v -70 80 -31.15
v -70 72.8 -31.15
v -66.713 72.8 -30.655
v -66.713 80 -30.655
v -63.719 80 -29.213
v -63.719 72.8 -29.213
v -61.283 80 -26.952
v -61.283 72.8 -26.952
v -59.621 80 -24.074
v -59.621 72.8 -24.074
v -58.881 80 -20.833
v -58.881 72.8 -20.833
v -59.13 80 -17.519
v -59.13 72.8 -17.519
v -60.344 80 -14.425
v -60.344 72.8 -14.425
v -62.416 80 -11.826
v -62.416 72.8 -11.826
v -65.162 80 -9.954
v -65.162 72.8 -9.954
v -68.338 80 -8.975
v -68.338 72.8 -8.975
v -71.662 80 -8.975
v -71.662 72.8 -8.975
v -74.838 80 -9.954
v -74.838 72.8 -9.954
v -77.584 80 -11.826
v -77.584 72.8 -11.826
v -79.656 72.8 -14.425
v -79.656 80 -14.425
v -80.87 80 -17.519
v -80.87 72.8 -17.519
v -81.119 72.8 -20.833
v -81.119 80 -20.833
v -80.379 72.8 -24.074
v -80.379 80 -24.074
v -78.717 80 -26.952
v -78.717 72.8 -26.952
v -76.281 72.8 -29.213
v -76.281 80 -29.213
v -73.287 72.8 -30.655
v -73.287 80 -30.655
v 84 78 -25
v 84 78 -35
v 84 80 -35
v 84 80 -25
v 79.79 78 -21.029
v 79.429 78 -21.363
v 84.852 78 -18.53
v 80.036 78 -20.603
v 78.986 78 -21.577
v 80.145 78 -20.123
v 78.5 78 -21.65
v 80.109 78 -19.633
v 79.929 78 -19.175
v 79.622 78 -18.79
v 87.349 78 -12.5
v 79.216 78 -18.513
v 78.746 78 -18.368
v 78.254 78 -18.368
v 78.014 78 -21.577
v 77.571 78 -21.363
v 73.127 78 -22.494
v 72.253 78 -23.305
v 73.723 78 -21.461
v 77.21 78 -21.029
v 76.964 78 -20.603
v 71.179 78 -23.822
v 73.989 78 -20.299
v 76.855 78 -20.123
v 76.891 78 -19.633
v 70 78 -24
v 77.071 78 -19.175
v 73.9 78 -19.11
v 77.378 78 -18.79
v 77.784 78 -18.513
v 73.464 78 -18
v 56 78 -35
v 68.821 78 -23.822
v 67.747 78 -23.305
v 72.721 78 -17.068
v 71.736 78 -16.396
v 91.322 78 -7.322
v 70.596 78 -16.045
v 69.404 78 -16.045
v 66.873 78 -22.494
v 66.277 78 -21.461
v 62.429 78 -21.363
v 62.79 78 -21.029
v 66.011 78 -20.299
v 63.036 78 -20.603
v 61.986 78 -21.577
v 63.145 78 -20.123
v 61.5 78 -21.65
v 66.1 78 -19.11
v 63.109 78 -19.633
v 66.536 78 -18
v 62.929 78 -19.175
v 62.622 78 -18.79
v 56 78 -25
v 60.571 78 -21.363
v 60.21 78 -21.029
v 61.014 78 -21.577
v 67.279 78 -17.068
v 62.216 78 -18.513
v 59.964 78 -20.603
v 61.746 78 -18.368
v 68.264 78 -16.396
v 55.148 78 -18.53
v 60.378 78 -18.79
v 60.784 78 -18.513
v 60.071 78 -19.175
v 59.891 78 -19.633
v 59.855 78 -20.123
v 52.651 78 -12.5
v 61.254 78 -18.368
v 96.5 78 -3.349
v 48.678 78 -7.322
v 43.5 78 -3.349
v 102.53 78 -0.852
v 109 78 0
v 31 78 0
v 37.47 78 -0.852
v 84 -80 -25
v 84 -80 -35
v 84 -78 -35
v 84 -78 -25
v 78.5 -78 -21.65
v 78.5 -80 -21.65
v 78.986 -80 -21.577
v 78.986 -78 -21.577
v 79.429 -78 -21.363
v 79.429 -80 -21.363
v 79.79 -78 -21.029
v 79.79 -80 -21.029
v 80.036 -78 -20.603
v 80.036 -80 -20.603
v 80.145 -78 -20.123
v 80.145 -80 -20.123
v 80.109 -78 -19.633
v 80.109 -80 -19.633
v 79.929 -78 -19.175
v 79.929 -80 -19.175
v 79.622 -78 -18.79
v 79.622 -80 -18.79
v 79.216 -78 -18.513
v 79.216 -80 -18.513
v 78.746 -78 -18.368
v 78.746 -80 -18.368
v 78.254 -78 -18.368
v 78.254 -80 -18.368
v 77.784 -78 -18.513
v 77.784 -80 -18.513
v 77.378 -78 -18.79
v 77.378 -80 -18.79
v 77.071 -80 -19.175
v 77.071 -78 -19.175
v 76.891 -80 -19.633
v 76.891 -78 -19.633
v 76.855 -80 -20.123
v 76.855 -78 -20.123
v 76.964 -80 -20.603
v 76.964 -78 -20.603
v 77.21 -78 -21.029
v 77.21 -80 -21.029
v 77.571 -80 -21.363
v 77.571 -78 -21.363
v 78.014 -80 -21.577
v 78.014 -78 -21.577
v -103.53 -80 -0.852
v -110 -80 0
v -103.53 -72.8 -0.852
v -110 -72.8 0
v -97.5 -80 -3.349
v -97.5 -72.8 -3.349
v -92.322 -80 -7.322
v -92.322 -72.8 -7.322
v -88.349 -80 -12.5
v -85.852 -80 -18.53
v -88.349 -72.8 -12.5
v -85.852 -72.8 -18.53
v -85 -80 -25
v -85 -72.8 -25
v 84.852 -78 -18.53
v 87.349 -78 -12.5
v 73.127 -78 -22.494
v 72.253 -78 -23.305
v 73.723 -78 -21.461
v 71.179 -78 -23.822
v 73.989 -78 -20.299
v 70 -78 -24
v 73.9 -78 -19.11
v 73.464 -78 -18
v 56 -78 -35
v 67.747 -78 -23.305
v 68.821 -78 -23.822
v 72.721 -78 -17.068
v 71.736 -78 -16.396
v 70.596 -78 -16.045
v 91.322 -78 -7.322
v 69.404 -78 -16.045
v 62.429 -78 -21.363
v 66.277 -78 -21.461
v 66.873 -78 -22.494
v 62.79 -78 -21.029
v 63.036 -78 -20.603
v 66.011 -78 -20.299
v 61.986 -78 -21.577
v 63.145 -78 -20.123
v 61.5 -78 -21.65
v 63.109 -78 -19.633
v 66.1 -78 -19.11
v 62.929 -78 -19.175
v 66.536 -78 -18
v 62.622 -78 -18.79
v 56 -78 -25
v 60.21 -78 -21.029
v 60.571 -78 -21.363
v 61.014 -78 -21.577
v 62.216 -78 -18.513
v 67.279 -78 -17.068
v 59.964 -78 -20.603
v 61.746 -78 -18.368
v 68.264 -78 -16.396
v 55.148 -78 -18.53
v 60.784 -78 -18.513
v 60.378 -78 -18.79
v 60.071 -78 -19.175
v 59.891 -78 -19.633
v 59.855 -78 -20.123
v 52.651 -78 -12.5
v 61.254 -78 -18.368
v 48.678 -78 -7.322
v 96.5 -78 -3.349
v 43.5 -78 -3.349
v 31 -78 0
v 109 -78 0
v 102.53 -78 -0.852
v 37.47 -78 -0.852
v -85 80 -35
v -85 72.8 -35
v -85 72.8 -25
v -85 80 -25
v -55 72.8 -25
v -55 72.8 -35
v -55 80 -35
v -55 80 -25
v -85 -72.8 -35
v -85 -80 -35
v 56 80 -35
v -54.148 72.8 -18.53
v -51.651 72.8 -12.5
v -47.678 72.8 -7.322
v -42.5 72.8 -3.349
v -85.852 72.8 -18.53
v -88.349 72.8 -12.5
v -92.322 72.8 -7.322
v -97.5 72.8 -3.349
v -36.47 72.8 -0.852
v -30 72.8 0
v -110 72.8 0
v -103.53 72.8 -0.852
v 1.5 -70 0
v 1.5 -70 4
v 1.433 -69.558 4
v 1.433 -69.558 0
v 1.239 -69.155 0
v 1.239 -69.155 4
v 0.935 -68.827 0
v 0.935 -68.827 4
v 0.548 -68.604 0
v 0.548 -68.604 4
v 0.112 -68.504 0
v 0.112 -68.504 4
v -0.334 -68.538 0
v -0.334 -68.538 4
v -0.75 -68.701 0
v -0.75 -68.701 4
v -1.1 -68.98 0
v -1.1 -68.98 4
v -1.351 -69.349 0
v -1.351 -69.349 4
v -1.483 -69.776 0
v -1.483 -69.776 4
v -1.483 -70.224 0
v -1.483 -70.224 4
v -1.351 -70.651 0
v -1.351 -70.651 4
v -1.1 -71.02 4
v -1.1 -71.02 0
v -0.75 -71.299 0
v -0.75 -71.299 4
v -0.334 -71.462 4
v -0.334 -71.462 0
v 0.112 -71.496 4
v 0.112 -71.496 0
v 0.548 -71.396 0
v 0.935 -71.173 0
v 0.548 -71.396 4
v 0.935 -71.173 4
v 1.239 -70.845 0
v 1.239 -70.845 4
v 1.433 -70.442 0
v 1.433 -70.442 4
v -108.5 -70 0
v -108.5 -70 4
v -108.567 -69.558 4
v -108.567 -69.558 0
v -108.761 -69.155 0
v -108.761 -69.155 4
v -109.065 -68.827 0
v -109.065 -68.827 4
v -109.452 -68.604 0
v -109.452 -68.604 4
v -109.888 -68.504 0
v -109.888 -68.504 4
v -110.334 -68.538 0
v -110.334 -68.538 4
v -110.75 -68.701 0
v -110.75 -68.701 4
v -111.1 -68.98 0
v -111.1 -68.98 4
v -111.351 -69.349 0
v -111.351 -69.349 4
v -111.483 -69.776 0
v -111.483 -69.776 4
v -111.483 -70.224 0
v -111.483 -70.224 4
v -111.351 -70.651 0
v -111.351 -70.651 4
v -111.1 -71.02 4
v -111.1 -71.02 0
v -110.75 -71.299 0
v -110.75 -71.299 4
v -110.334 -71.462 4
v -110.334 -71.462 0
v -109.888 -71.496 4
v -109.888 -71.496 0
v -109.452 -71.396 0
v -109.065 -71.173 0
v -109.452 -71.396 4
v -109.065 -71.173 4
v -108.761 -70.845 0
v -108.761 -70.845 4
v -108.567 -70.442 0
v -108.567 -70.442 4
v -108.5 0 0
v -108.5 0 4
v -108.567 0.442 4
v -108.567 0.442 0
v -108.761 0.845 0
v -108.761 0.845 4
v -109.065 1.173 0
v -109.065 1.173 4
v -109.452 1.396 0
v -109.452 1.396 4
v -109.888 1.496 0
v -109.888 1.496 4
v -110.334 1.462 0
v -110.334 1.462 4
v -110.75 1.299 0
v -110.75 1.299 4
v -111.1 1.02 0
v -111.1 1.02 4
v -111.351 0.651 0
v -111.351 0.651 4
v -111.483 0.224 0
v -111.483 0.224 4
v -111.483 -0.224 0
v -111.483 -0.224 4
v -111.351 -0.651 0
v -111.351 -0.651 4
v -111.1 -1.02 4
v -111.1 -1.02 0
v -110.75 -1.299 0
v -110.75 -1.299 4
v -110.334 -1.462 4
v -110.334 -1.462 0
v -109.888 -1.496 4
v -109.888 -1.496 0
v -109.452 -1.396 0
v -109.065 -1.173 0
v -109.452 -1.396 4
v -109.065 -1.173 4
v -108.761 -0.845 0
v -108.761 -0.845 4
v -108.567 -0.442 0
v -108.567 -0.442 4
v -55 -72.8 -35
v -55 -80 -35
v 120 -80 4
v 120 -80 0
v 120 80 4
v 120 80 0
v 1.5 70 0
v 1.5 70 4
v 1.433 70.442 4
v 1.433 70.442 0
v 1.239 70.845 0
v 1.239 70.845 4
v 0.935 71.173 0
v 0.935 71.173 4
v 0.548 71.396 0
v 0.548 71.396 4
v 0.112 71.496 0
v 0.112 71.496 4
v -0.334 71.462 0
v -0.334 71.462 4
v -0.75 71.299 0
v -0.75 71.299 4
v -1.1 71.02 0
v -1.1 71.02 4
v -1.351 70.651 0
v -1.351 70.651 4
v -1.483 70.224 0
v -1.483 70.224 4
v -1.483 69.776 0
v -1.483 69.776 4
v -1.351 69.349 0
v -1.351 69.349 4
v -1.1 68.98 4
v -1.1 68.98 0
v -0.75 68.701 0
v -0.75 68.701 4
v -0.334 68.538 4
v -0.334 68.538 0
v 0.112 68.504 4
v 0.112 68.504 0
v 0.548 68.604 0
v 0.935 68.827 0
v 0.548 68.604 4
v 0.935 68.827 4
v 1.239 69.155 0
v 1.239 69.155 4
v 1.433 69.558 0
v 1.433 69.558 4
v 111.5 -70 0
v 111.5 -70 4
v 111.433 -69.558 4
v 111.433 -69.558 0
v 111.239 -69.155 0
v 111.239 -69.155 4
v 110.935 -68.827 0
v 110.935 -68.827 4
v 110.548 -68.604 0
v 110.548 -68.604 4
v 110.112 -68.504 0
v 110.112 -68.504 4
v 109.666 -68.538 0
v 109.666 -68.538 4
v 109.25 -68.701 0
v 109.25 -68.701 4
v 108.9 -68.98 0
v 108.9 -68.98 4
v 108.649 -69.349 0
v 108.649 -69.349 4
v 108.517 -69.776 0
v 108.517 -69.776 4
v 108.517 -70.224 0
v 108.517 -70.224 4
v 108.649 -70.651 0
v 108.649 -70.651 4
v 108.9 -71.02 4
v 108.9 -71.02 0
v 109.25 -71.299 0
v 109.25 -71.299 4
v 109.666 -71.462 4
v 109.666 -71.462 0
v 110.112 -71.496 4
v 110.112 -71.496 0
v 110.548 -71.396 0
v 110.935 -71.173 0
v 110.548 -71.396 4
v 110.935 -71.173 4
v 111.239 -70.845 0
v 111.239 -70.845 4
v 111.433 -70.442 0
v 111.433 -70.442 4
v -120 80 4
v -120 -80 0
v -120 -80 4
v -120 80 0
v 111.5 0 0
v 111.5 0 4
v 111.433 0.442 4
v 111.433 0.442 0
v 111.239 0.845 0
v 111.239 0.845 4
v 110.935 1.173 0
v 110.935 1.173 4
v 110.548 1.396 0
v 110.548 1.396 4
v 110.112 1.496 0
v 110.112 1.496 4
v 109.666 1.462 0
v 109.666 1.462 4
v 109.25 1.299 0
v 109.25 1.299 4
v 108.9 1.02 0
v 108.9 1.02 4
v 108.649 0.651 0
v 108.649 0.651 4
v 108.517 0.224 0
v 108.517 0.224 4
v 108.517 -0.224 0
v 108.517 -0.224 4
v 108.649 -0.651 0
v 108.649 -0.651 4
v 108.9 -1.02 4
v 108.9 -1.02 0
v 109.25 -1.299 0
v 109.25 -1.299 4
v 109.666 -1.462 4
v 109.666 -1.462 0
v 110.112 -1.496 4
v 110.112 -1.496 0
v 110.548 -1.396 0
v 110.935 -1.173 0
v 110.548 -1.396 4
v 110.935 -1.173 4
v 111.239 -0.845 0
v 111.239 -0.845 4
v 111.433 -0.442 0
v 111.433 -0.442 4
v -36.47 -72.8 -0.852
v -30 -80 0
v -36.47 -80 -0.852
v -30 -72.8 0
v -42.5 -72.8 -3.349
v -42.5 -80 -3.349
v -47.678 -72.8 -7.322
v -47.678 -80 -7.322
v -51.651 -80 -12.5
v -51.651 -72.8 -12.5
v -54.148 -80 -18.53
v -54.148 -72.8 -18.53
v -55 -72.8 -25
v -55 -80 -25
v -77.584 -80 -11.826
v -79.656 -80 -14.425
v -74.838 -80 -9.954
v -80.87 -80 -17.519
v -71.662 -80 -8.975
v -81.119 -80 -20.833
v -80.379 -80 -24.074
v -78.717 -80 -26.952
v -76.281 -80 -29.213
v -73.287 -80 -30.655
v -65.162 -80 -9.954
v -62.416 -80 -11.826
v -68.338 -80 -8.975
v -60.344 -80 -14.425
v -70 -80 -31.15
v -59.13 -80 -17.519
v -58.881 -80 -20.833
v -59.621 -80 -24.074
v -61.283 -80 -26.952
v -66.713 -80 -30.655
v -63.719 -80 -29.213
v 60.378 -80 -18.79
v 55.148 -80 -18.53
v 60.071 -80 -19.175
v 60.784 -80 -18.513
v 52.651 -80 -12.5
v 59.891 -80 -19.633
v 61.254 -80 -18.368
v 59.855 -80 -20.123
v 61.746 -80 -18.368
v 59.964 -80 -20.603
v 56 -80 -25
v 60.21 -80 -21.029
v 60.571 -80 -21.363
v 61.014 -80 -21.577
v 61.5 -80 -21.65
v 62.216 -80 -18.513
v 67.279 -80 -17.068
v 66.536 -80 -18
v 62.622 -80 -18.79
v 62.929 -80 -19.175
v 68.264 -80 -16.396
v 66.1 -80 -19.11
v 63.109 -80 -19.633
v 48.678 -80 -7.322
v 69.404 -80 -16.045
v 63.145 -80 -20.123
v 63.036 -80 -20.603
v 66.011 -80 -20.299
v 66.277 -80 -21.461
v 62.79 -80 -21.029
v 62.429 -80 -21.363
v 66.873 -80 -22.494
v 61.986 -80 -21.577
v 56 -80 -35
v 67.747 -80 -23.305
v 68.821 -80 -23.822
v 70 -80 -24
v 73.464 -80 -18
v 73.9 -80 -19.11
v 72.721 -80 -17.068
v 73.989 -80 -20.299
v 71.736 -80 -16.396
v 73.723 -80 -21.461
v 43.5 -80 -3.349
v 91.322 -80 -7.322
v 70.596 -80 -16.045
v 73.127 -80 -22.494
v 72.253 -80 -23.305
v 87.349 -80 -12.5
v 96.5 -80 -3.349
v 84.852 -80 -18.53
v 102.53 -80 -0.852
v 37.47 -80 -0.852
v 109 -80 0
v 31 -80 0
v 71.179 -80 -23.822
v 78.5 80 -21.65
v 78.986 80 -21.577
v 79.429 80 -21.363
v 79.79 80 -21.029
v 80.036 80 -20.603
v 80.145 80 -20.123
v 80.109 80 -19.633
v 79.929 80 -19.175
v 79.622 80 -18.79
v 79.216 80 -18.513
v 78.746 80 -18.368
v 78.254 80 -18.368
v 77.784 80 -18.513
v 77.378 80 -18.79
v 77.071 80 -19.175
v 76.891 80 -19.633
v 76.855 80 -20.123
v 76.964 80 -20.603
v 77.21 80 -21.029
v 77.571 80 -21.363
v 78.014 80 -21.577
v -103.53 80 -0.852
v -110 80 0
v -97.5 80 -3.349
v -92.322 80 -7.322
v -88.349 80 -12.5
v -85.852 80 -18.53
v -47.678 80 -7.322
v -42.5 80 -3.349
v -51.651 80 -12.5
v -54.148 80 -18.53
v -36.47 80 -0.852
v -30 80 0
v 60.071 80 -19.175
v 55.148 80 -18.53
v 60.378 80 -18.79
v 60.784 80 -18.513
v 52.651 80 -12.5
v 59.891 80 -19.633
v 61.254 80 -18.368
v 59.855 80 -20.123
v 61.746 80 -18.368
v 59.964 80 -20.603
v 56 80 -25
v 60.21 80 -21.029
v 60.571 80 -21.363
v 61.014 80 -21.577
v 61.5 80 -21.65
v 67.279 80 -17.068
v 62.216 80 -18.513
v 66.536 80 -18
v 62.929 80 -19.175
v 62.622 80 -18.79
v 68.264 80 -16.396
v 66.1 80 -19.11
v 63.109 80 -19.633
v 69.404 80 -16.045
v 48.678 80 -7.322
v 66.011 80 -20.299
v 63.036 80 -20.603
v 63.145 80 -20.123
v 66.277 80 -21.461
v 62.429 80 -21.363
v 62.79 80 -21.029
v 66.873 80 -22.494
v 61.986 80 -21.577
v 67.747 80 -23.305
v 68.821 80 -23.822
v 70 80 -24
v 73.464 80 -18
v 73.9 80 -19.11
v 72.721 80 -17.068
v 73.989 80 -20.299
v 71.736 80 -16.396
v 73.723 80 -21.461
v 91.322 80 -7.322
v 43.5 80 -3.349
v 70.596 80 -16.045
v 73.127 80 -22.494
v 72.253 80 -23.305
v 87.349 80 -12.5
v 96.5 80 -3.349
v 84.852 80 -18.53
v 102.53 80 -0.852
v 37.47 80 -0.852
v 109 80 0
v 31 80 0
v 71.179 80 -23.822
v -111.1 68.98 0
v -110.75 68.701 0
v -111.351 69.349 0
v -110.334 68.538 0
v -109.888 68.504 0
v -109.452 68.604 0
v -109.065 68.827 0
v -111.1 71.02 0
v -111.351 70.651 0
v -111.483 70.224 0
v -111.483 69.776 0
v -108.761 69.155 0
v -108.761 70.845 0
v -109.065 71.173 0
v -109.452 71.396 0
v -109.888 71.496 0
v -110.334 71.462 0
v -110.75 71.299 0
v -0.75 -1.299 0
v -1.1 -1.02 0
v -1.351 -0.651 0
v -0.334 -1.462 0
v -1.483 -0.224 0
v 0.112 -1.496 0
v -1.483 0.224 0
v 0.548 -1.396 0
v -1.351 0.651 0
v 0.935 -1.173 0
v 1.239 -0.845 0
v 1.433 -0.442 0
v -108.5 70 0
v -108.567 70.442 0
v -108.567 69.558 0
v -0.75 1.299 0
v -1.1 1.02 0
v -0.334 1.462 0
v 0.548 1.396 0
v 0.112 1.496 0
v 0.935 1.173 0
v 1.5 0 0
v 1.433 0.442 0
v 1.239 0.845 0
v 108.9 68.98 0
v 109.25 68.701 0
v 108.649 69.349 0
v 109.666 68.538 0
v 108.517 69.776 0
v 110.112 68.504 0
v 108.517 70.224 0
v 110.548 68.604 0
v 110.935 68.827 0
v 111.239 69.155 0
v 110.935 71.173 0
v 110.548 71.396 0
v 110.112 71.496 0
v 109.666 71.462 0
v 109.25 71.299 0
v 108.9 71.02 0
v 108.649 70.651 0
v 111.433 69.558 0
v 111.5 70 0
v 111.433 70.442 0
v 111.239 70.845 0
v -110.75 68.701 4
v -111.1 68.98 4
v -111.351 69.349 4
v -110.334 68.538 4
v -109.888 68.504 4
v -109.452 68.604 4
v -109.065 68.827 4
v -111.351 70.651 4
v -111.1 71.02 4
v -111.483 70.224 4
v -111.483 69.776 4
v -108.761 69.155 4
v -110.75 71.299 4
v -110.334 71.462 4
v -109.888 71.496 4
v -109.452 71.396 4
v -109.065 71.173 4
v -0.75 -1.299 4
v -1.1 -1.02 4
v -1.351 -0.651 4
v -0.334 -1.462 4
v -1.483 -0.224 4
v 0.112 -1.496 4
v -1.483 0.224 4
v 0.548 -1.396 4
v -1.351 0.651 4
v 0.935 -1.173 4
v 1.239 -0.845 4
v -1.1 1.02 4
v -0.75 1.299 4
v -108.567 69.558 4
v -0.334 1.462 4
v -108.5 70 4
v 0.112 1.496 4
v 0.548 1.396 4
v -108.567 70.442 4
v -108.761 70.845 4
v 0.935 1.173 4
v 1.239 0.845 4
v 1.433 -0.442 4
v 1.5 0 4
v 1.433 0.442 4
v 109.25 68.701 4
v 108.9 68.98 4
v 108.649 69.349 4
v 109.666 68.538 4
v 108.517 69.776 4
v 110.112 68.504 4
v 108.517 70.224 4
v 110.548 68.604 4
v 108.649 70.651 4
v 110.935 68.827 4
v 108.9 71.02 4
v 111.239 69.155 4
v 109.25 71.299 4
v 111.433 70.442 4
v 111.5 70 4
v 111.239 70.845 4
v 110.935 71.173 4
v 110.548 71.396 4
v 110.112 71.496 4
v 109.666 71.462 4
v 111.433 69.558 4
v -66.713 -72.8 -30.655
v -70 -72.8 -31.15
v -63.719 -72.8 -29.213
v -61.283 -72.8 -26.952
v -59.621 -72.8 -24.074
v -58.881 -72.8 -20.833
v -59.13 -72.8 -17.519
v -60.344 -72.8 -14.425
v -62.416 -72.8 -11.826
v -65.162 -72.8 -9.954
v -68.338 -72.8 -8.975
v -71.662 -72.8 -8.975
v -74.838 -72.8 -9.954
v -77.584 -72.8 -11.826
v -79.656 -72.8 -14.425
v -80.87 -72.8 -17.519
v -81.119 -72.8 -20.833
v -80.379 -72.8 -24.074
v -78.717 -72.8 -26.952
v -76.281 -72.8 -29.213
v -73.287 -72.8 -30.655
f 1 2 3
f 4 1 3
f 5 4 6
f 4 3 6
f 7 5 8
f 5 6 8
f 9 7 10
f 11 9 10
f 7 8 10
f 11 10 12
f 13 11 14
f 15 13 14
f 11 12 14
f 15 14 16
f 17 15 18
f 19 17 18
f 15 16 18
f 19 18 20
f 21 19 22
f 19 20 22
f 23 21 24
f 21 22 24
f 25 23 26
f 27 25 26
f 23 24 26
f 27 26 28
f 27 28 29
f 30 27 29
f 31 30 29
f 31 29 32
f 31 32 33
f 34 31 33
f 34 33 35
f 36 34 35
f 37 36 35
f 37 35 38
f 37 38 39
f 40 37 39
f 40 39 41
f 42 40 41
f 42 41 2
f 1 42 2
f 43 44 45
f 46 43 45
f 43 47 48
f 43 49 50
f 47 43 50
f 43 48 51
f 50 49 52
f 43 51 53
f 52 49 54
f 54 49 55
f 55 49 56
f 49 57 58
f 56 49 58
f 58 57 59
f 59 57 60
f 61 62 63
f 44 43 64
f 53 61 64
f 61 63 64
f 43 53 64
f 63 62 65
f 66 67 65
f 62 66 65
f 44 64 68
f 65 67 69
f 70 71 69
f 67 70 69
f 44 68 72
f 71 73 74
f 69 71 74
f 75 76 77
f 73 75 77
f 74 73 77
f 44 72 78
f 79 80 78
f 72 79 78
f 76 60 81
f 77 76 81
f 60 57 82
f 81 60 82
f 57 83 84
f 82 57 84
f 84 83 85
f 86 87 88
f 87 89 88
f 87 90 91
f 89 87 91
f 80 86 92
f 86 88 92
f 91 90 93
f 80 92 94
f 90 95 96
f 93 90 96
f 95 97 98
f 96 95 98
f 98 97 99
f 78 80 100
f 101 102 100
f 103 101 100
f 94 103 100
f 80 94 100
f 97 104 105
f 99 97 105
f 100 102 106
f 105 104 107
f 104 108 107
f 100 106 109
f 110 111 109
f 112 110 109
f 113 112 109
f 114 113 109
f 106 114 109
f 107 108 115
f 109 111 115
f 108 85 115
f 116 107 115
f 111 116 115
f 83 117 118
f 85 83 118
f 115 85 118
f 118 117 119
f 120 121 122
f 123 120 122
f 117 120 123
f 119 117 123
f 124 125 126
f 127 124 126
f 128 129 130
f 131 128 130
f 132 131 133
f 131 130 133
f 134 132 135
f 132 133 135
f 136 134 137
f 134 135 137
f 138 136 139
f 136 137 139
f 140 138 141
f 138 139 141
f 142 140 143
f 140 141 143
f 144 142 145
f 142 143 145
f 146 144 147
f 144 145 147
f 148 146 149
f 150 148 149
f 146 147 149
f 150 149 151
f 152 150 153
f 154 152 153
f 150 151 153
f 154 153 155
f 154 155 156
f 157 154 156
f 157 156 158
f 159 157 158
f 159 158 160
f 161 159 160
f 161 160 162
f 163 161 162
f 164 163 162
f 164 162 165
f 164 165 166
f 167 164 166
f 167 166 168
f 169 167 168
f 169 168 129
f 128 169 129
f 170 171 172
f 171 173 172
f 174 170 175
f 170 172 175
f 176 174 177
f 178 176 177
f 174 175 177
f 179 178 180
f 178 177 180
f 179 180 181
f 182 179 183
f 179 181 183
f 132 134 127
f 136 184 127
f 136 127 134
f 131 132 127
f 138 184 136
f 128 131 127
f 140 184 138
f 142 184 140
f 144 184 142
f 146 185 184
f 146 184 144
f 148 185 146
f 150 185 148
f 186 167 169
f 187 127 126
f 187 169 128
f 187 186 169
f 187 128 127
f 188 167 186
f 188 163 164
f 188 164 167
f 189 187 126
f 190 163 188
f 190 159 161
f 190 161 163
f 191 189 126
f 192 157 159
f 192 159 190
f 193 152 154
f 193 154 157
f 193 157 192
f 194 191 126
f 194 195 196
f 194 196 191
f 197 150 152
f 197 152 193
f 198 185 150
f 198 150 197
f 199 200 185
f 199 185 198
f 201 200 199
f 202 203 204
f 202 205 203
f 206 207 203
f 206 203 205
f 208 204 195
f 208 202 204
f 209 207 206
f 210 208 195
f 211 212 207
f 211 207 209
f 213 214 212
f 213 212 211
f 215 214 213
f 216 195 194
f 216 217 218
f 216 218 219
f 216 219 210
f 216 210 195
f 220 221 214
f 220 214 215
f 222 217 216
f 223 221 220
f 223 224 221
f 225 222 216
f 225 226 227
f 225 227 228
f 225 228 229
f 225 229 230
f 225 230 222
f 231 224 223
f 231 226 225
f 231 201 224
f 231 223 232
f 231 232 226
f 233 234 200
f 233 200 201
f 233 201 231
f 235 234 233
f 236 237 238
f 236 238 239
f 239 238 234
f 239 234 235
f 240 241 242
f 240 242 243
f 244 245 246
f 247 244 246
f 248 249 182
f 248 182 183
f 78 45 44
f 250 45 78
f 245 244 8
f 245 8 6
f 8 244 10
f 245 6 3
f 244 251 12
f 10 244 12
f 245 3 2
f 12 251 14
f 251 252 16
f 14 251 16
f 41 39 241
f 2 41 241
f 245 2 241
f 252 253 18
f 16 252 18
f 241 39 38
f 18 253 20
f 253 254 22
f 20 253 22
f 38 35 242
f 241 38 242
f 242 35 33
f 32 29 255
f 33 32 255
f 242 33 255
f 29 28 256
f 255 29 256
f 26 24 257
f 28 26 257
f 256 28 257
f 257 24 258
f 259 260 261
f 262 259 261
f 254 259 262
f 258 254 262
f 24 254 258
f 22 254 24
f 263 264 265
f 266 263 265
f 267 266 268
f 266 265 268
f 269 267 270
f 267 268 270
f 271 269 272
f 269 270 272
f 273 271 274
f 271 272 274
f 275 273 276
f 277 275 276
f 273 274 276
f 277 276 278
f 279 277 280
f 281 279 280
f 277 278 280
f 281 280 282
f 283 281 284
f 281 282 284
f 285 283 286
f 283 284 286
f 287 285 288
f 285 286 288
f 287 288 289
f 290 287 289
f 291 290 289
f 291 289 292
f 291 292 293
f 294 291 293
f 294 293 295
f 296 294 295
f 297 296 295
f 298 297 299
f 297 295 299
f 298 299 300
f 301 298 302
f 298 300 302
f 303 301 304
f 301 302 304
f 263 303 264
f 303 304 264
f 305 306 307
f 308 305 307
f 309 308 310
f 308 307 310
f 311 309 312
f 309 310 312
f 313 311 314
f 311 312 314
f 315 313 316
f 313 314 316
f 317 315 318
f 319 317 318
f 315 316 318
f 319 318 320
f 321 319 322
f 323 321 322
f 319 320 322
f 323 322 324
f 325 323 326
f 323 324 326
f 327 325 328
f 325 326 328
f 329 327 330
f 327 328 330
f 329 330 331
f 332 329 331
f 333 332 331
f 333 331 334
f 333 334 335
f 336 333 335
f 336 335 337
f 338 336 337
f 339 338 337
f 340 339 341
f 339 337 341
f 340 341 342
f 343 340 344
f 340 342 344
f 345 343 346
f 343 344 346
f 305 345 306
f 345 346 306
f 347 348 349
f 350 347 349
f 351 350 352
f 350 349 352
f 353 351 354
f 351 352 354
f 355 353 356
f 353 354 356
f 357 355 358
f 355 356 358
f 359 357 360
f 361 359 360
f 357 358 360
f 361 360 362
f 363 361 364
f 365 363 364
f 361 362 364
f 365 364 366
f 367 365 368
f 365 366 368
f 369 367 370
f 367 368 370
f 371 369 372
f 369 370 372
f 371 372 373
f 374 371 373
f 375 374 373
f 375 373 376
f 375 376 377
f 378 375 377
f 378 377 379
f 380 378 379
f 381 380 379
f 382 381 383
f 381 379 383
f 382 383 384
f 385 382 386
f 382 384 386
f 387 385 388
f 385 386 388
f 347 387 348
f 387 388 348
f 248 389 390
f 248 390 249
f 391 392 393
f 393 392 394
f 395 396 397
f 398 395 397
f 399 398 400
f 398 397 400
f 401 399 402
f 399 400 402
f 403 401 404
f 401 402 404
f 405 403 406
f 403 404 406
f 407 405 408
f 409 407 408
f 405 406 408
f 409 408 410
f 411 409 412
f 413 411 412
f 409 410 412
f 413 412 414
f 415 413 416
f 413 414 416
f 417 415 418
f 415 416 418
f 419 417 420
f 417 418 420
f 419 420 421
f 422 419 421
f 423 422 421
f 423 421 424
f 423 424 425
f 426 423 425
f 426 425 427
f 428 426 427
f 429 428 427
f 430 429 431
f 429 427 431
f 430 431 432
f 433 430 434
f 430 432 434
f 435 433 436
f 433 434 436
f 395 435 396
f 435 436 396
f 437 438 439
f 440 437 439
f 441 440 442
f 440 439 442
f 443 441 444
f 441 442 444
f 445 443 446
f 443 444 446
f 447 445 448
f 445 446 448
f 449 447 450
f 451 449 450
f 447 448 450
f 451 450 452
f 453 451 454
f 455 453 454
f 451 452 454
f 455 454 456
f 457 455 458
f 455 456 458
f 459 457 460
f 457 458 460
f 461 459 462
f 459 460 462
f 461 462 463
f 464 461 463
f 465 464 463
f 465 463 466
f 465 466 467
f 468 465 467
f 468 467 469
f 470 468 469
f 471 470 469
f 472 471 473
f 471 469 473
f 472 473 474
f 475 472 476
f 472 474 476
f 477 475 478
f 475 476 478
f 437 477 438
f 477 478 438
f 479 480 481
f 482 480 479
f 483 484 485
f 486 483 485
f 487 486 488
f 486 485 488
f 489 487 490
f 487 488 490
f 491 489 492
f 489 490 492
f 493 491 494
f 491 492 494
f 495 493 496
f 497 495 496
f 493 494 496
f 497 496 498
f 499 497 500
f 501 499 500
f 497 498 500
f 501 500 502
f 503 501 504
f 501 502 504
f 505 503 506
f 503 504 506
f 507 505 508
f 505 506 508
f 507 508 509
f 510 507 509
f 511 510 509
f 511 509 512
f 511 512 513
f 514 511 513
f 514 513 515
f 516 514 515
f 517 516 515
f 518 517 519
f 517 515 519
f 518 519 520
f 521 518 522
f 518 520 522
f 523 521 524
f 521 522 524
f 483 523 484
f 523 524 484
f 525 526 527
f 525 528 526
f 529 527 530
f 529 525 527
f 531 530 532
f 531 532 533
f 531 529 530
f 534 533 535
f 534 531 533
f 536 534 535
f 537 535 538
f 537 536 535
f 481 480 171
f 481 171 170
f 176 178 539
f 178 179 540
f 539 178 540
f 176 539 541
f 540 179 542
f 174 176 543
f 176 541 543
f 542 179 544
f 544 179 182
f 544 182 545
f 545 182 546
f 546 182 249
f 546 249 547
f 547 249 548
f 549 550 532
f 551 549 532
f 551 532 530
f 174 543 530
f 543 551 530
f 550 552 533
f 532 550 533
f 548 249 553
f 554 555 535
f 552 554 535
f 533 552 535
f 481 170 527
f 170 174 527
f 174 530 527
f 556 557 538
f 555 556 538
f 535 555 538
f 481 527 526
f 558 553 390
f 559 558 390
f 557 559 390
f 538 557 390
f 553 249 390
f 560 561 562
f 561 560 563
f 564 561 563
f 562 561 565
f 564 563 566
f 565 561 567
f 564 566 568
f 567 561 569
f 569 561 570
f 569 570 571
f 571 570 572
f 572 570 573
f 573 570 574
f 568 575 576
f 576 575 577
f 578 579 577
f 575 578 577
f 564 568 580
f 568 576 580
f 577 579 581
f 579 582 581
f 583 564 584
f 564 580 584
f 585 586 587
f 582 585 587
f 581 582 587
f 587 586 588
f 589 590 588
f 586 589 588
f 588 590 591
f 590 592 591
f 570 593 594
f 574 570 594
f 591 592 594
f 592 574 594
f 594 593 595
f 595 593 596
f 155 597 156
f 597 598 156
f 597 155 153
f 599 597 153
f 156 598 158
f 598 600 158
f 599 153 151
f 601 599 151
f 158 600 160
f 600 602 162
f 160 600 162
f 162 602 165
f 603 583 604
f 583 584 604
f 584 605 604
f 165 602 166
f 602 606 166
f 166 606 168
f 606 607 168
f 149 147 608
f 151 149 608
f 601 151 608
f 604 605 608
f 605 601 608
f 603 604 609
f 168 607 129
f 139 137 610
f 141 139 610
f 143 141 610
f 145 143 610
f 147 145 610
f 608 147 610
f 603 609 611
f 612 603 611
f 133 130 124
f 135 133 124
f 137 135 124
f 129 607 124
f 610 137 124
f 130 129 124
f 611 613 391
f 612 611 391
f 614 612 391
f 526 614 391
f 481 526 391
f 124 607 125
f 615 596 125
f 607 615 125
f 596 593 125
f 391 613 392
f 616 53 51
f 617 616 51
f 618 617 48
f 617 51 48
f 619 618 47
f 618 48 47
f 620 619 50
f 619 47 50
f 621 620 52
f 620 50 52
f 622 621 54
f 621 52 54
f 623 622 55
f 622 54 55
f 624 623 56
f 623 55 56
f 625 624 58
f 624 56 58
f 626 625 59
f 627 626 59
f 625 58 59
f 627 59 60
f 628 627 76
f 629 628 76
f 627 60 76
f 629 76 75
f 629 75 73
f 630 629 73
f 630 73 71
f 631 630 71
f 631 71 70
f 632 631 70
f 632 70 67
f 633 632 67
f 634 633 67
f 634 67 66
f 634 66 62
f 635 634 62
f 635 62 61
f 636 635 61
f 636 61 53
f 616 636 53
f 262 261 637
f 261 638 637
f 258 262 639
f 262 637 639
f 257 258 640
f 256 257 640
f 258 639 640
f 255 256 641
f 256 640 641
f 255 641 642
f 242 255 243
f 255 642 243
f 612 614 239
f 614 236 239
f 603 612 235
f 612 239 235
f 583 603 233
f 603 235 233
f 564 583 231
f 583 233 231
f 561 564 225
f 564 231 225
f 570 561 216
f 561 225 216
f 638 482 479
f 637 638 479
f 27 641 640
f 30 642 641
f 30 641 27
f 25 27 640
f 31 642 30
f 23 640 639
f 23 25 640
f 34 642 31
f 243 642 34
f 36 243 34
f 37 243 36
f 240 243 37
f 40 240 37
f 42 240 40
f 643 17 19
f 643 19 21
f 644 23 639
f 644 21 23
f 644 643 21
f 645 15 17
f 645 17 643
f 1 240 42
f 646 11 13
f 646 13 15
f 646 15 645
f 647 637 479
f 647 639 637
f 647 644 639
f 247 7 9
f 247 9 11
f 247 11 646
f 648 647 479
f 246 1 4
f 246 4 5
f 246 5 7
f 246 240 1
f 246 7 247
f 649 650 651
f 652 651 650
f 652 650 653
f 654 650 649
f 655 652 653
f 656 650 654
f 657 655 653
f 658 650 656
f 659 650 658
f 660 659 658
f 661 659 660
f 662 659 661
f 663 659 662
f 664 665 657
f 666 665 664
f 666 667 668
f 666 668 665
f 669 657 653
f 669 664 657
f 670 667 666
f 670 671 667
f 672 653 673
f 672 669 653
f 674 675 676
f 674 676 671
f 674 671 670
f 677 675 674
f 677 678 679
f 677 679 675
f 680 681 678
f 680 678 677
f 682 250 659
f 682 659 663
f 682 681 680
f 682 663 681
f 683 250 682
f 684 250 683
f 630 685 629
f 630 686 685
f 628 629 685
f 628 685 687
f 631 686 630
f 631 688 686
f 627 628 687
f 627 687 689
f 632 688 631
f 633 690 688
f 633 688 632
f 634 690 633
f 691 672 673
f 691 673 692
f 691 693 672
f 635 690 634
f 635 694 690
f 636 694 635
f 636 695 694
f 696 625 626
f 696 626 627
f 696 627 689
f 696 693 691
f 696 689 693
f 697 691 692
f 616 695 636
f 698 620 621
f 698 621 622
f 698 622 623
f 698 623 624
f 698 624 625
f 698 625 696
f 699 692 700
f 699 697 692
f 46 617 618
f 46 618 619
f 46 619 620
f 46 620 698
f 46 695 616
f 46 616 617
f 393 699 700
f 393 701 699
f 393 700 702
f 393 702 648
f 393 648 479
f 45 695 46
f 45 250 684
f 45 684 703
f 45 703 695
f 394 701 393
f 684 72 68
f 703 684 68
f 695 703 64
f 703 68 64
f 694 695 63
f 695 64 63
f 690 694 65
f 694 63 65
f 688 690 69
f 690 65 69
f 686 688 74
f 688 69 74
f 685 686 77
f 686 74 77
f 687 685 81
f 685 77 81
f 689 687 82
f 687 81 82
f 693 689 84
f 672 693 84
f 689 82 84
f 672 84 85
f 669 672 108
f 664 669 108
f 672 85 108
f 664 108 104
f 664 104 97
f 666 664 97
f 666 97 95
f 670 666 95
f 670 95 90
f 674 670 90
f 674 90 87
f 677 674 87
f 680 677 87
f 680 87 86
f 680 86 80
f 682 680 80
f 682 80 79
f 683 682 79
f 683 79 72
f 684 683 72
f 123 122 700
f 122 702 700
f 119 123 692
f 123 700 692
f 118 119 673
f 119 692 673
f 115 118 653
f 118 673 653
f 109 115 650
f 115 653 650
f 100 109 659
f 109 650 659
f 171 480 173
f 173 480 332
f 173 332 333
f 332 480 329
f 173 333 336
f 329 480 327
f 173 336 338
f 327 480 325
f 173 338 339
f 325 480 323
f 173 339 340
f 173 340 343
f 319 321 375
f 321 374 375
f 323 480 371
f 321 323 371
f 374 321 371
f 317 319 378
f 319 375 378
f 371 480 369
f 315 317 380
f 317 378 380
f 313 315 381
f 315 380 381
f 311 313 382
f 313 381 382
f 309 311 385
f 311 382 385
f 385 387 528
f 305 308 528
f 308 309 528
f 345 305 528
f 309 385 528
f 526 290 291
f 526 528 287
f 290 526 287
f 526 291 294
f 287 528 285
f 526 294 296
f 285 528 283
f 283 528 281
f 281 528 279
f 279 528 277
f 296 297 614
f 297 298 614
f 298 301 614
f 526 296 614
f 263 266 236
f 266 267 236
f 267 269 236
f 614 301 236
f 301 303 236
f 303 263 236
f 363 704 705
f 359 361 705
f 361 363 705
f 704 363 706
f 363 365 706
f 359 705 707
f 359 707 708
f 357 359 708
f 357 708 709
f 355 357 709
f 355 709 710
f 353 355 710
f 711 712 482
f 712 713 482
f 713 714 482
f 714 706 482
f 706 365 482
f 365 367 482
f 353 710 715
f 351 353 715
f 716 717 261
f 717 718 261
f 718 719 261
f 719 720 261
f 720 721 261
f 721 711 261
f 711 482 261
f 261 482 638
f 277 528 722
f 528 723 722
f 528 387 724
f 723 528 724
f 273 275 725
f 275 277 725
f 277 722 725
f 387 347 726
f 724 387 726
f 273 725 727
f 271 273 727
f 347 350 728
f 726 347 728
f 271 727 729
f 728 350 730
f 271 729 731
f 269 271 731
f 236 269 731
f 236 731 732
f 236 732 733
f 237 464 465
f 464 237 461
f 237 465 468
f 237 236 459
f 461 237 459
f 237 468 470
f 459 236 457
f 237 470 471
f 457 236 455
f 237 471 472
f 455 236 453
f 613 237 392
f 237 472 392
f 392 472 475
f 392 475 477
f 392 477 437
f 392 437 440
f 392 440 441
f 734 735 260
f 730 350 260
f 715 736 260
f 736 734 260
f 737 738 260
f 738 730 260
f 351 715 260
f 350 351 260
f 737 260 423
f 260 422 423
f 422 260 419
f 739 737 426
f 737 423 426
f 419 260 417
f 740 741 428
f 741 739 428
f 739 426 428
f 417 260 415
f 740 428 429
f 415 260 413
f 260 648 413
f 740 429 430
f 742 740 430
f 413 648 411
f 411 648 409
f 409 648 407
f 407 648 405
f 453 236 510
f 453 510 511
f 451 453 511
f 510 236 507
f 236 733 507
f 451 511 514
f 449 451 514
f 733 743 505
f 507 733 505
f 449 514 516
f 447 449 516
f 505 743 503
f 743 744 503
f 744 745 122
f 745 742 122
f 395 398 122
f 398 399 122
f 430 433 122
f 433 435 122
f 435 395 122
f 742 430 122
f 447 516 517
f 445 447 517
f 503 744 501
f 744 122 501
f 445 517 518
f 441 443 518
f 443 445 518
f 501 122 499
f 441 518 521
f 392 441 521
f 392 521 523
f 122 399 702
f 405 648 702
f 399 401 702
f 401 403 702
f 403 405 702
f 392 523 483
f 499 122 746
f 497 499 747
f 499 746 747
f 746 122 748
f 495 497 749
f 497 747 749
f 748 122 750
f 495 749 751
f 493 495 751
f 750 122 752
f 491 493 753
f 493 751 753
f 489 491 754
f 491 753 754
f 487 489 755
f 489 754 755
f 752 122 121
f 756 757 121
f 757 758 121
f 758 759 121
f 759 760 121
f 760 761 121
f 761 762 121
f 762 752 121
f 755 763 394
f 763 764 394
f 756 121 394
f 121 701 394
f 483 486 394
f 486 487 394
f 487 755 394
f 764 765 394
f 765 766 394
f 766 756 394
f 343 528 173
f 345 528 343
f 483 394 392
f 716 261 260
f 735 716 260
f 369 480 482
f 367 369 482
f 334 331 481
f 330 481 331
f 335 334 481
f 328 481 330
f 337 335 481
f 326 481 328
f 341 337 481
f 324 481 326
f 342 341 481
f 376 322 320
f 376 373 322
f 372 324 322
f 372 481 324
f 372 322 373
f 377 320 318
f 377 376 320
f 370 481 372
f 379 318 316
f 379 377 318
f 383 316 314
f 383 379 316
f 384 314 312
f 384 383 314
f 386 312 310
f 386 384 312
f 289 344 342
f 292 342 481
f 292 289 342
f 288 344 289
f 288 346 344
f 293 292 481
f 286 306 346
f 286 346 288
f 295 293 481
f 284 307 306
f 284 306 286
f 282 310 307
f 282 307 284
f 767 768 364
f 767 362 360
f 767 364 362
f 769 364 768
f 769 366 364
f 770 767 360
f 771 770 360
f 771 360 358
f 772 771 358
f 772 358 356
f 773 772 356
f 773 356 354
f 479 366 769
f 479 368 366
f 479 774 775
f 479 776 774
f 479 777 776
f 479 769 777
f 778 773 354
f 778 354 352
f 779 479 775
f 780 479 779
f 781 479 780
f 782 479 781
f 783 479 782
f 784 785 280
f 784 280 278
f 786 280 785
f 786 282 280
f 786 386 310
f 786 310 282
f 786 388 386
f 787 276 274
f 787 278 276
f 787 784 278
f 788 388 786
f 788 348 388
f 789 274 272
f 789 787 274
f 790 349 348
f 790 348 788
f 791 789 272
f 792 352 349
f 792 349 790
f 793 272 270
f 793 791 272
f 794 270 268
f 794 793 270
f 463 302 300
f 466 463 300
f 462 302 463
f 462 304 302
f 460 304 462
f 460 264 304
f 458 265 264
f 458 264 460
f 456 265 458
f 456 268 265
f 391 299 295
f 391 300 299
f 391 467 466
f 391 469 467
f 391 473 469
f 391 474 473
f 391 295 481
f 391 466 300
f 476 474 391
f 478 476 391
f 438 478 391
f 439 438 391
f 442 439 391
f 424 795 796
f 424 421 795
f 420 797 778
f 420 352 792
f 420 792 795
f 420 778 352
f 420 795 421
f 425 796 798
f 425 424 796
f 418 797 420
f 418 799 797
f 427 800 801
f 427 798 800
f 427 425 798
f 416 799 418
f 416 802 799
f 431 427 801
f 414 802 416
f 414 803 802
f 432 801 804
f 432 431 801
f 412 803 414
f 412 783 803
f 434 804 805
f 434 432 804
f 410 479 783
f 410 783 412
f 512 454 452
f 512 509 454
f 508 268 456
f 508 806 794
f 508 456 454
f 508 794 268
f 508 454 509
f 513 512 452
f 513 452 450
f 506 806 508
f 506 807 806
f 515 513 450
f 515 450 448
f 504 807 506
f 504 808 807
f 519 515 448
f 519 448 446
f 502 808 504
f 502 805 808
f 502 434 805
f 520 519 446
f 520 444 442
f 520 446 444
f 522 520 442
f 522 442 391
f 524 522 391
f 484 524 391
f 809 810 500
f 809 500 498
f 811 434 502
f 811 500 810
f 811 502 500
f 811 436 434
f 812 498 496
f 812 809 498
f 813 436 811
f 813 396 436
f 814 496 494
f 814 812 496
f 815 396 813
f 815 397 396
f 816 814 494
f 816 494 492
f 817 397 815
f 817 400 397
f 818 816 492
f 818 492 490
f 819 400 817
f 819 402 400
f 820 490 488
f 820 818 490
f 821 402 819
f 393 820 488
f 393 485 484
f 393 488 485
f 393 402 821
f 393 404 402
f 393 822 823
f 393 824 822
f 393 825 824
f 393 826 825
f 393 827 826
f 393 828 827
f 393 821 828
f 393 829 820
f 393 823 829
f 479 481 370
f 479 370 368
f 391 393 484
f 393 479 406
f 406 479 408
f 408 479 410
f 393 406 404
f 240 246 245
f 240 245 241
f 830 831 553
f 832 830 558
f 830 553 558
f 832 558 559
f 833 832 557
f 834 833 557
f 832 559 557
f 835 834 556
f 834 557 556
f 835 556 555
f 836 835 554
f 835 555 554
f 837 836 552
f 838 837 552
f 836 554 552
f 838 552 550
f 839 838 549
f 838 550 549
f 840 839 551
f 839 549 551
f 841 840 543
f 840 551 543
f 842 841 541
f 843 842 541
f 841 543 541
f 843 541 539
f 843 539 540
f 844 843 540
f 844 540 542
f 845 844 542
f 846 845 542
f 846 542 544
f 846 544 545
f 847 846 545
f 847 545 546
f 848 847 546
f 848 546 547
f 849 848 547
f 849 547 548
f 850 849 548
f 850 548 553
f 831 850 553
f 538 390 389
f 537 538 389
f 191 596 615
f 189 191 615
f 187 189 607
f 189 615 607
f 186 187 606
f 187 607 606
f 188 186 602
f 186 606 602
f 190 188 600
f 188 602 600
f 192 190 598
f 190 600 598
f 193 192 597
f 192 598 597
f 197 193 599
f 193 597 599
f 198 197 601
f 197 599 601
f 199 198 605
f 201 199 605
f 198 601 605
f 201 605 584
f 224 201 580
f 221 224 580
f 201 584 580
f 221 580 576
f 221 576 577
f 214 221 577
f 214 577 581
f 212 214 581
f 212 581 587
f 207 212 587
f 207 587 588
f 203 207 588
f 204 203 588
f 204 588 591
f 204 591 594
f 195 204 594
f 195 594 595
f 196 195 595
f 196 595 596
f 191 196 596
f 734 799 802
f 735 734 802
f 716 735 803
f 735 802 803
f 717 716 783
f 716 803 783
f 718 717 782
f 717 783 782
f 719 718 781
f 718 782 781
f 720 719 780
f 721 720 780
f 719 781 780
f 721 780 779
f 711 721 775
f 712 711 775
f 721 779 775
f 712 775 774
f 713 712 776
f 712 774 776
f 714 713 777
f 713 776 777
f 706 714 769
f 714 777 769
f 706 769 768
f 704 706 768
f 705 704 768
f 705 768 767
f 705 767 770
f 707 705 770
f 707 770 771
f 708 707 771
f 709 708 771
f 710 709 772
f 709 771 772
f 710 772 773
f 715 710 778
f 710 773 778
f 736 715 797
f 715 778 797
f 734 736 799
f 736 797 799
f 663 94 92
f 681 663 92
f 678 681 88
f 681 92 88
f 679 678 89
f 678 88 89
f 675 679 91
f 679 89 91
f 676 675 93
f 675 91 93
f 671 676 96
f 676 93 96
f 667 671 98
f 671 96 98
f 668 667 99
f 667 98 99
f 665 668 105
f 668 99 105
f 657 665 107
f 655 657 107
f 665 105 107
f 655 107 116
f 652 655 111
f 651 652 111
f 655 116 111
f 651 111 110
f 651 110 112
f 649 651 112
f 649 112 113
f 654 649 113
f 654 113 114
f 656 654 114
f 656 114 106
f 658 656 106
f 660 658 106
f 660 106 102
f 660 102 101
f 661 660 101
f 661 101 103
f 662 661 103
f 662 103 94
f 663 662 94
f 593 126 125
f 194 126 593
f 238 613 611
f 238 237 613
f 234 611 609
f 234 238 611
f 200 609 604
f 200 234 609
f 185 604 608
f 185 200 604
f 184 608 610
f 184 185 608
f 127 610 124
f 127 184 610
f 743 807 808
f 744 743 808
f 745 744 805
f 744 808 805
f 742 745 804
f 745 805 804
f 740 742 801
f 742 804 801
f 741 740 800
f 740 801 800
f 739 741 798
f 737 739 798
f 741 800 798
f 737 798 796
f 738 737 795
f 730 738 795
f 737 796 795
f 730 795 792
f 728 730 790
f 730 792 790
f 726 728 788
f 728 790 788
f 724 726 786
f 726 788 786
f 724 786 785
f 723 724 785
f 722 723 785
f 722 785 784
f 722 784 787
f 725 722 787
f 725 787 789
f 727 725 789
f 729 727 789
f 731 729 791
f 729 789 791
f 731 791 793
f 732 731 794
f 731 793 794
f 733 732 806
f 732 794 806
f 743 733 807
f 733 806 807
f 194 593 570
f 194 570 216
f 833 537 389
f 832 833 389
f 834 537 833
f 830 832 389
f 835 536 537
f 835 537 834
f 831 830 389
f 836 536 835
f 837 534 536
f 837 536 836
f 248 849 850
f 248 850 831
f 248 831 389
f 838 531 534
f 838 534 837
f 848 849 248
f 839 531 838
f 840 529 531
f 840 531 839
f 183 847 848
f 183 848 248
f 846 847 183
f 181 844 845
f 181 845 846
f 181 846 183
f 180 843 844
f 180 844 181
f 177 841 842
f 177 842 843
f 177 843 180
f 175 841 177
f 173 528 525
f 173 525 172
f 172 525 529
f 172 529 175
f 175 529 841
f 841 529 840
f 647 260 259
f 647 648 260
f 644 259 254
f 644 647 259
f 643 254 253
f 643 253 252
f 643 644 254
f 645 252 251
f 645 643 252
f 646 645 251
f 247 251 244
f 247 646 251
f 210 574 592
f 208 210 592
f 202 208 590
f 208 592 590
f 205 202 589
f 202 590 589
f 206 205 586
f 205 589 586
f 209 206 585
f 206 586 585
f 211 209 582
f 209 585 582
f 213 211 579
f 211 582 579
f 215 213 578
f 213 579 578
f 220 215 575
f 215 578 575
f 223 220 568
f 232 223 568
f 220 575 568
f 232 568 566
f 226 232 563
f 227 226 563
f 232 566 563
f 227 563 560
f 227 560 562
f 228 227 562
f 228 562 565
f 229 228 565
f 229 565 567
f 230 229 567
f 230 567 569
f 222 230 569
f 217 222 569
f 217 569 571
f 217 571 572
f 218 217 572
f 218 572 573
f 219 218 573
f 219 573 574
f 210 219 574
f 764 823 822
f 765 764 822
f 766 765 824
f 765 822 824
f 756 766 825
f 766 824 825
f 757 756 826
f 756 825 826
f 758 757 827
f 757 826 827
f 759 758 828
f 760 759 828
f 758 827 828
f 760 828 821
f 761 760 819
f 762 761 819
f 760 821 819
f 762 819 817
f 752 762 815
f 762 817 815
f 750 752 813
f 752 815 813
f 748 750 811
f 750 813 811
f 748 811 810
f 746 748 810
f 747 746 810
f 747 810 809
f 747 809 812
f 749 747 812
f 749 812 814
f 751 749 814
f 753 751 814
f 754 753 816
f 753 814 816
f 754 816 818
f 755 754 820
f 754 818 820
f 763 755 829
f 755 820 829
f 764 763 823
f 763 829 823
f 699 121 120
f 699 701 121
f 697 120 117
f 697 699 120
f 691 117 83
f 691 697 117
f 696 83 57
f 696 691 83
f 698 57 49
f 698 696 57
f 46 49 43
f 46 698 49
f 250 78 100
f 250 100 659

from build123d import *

# Parameters (mm, degrees)
SKETCH1_W           = 240
SKETCH1_H           = 160
BOSS_EXTRUDE1_DEPTH = 4
SKETCH2_W           = 28
SKETCH2_H           = 2
SKETCH2_W_2         = 30
SKETCH2_H_2         = 7.2
BOSS_EXTRUDE3_DEPTH = 35
SKETCH3_R           = 1.65
SKETCH3_R_2         = 4
SKETCH3_R_3         = 11.15
CUT_EXTRUDE1_DEPTH  = 170
SKETCH5_R           = 1.5
CUT_EXTRUDE2_DEPTH  = 4
FILLET1_R           = 25


with BuildPart() as part:
    # Sketch1 → Boss-Extrude1 (new body)
    with BuildSketch(Plane.XY):
        Rectangle(SKETCH1_W, SKETCH1_H)
    extrude(amount=BOSS_EXTRUDE1_DEPTH)

    # Sketch2 → Boss-Extrude3 (add)
    with BuildSketch(Plane(origin=(0, 0, 0), x_dir=(-1, 0, 0), z_dir=(0, 0, -1))):
        with Locations((-70, 79)):
            Rectangle(SKETCH2_W, SKETCH2_H)
        with Locations((-70, -79)):
            Rectangle(SKETCH2_W, SKETCH2_H)
        with Locations((70, -76.4)):
            Rectangle(SKETCH2_W_2, SKETCH2_H_2)
        with Locations((70, 76.4)):
            Rectangle(SKETCH2_W_2, SKETCH2_H_2)
    extrude(amount=BOSS_EXTRUDE3_DEPTH)

    # Sketch3 → Cut-Extrude1 (cut)
    with BuildSketch(Plane.XZ.offset(80)):
        with Locations((78.5, -20)):
            Circle(SKETCH3_R)
        with Locations((61.5, -20)):
            Circle(SKETCH3_R)
        with Locations((70, -20)):
            Circle(SKETCH3_R_2)
        with Locations((-70, -20)):
            Circle(SKETCH3_R_3)
    extrude(amount=-CUT_EXTRUDE1_DEPTH, mode=Mode.SUBTRACT)

    # Sketch5 → Cut-Extrude2 (cut)
    with BuildSketch(Plane.XY.offset(4)):
        with Locations((-110, 70)):
            Circle(SKETCH5_R)
        with Locations((0, 70)):
            Circle(SKETCH5_R)
        with Locations((110, 70)):
            Circle(SKETCH5_R)
        Circle(SKETCH5_R)
        with Locations((110, 0)):
            Circle(SKETCH5_R)
        with Locations((0, -70)):
            Circle(SKETCH5_R)
        with Locations((110, -70)):
            Circle(SKETCH5_R)
        with Locations((-110, 0)):
            Circle(SKETCH5_R)
        with Locations((-110, -70)):
            Circle(SKETCH5_R)
    extrude(amount=-CUT_EXTRUDE2_DEPTH, mode=Mode.SUBTRACT)

    # Fillet1
    fillet1_edges = [part.edges().sort_by_distance(p)[0] for p in [
        (-85, 76.4, 0),
        (56, 79, 0),
        (-55, 76.4, 0),
        (84, 79, 0),
        (-55, -76.4, 0),
        (-85, -76.4, 0),
        (56, -79, 0),
        (84, -79, 0),
    ]]
    fillet(fillet1_edges, radius=FILLET1_R)


solid = part.part
